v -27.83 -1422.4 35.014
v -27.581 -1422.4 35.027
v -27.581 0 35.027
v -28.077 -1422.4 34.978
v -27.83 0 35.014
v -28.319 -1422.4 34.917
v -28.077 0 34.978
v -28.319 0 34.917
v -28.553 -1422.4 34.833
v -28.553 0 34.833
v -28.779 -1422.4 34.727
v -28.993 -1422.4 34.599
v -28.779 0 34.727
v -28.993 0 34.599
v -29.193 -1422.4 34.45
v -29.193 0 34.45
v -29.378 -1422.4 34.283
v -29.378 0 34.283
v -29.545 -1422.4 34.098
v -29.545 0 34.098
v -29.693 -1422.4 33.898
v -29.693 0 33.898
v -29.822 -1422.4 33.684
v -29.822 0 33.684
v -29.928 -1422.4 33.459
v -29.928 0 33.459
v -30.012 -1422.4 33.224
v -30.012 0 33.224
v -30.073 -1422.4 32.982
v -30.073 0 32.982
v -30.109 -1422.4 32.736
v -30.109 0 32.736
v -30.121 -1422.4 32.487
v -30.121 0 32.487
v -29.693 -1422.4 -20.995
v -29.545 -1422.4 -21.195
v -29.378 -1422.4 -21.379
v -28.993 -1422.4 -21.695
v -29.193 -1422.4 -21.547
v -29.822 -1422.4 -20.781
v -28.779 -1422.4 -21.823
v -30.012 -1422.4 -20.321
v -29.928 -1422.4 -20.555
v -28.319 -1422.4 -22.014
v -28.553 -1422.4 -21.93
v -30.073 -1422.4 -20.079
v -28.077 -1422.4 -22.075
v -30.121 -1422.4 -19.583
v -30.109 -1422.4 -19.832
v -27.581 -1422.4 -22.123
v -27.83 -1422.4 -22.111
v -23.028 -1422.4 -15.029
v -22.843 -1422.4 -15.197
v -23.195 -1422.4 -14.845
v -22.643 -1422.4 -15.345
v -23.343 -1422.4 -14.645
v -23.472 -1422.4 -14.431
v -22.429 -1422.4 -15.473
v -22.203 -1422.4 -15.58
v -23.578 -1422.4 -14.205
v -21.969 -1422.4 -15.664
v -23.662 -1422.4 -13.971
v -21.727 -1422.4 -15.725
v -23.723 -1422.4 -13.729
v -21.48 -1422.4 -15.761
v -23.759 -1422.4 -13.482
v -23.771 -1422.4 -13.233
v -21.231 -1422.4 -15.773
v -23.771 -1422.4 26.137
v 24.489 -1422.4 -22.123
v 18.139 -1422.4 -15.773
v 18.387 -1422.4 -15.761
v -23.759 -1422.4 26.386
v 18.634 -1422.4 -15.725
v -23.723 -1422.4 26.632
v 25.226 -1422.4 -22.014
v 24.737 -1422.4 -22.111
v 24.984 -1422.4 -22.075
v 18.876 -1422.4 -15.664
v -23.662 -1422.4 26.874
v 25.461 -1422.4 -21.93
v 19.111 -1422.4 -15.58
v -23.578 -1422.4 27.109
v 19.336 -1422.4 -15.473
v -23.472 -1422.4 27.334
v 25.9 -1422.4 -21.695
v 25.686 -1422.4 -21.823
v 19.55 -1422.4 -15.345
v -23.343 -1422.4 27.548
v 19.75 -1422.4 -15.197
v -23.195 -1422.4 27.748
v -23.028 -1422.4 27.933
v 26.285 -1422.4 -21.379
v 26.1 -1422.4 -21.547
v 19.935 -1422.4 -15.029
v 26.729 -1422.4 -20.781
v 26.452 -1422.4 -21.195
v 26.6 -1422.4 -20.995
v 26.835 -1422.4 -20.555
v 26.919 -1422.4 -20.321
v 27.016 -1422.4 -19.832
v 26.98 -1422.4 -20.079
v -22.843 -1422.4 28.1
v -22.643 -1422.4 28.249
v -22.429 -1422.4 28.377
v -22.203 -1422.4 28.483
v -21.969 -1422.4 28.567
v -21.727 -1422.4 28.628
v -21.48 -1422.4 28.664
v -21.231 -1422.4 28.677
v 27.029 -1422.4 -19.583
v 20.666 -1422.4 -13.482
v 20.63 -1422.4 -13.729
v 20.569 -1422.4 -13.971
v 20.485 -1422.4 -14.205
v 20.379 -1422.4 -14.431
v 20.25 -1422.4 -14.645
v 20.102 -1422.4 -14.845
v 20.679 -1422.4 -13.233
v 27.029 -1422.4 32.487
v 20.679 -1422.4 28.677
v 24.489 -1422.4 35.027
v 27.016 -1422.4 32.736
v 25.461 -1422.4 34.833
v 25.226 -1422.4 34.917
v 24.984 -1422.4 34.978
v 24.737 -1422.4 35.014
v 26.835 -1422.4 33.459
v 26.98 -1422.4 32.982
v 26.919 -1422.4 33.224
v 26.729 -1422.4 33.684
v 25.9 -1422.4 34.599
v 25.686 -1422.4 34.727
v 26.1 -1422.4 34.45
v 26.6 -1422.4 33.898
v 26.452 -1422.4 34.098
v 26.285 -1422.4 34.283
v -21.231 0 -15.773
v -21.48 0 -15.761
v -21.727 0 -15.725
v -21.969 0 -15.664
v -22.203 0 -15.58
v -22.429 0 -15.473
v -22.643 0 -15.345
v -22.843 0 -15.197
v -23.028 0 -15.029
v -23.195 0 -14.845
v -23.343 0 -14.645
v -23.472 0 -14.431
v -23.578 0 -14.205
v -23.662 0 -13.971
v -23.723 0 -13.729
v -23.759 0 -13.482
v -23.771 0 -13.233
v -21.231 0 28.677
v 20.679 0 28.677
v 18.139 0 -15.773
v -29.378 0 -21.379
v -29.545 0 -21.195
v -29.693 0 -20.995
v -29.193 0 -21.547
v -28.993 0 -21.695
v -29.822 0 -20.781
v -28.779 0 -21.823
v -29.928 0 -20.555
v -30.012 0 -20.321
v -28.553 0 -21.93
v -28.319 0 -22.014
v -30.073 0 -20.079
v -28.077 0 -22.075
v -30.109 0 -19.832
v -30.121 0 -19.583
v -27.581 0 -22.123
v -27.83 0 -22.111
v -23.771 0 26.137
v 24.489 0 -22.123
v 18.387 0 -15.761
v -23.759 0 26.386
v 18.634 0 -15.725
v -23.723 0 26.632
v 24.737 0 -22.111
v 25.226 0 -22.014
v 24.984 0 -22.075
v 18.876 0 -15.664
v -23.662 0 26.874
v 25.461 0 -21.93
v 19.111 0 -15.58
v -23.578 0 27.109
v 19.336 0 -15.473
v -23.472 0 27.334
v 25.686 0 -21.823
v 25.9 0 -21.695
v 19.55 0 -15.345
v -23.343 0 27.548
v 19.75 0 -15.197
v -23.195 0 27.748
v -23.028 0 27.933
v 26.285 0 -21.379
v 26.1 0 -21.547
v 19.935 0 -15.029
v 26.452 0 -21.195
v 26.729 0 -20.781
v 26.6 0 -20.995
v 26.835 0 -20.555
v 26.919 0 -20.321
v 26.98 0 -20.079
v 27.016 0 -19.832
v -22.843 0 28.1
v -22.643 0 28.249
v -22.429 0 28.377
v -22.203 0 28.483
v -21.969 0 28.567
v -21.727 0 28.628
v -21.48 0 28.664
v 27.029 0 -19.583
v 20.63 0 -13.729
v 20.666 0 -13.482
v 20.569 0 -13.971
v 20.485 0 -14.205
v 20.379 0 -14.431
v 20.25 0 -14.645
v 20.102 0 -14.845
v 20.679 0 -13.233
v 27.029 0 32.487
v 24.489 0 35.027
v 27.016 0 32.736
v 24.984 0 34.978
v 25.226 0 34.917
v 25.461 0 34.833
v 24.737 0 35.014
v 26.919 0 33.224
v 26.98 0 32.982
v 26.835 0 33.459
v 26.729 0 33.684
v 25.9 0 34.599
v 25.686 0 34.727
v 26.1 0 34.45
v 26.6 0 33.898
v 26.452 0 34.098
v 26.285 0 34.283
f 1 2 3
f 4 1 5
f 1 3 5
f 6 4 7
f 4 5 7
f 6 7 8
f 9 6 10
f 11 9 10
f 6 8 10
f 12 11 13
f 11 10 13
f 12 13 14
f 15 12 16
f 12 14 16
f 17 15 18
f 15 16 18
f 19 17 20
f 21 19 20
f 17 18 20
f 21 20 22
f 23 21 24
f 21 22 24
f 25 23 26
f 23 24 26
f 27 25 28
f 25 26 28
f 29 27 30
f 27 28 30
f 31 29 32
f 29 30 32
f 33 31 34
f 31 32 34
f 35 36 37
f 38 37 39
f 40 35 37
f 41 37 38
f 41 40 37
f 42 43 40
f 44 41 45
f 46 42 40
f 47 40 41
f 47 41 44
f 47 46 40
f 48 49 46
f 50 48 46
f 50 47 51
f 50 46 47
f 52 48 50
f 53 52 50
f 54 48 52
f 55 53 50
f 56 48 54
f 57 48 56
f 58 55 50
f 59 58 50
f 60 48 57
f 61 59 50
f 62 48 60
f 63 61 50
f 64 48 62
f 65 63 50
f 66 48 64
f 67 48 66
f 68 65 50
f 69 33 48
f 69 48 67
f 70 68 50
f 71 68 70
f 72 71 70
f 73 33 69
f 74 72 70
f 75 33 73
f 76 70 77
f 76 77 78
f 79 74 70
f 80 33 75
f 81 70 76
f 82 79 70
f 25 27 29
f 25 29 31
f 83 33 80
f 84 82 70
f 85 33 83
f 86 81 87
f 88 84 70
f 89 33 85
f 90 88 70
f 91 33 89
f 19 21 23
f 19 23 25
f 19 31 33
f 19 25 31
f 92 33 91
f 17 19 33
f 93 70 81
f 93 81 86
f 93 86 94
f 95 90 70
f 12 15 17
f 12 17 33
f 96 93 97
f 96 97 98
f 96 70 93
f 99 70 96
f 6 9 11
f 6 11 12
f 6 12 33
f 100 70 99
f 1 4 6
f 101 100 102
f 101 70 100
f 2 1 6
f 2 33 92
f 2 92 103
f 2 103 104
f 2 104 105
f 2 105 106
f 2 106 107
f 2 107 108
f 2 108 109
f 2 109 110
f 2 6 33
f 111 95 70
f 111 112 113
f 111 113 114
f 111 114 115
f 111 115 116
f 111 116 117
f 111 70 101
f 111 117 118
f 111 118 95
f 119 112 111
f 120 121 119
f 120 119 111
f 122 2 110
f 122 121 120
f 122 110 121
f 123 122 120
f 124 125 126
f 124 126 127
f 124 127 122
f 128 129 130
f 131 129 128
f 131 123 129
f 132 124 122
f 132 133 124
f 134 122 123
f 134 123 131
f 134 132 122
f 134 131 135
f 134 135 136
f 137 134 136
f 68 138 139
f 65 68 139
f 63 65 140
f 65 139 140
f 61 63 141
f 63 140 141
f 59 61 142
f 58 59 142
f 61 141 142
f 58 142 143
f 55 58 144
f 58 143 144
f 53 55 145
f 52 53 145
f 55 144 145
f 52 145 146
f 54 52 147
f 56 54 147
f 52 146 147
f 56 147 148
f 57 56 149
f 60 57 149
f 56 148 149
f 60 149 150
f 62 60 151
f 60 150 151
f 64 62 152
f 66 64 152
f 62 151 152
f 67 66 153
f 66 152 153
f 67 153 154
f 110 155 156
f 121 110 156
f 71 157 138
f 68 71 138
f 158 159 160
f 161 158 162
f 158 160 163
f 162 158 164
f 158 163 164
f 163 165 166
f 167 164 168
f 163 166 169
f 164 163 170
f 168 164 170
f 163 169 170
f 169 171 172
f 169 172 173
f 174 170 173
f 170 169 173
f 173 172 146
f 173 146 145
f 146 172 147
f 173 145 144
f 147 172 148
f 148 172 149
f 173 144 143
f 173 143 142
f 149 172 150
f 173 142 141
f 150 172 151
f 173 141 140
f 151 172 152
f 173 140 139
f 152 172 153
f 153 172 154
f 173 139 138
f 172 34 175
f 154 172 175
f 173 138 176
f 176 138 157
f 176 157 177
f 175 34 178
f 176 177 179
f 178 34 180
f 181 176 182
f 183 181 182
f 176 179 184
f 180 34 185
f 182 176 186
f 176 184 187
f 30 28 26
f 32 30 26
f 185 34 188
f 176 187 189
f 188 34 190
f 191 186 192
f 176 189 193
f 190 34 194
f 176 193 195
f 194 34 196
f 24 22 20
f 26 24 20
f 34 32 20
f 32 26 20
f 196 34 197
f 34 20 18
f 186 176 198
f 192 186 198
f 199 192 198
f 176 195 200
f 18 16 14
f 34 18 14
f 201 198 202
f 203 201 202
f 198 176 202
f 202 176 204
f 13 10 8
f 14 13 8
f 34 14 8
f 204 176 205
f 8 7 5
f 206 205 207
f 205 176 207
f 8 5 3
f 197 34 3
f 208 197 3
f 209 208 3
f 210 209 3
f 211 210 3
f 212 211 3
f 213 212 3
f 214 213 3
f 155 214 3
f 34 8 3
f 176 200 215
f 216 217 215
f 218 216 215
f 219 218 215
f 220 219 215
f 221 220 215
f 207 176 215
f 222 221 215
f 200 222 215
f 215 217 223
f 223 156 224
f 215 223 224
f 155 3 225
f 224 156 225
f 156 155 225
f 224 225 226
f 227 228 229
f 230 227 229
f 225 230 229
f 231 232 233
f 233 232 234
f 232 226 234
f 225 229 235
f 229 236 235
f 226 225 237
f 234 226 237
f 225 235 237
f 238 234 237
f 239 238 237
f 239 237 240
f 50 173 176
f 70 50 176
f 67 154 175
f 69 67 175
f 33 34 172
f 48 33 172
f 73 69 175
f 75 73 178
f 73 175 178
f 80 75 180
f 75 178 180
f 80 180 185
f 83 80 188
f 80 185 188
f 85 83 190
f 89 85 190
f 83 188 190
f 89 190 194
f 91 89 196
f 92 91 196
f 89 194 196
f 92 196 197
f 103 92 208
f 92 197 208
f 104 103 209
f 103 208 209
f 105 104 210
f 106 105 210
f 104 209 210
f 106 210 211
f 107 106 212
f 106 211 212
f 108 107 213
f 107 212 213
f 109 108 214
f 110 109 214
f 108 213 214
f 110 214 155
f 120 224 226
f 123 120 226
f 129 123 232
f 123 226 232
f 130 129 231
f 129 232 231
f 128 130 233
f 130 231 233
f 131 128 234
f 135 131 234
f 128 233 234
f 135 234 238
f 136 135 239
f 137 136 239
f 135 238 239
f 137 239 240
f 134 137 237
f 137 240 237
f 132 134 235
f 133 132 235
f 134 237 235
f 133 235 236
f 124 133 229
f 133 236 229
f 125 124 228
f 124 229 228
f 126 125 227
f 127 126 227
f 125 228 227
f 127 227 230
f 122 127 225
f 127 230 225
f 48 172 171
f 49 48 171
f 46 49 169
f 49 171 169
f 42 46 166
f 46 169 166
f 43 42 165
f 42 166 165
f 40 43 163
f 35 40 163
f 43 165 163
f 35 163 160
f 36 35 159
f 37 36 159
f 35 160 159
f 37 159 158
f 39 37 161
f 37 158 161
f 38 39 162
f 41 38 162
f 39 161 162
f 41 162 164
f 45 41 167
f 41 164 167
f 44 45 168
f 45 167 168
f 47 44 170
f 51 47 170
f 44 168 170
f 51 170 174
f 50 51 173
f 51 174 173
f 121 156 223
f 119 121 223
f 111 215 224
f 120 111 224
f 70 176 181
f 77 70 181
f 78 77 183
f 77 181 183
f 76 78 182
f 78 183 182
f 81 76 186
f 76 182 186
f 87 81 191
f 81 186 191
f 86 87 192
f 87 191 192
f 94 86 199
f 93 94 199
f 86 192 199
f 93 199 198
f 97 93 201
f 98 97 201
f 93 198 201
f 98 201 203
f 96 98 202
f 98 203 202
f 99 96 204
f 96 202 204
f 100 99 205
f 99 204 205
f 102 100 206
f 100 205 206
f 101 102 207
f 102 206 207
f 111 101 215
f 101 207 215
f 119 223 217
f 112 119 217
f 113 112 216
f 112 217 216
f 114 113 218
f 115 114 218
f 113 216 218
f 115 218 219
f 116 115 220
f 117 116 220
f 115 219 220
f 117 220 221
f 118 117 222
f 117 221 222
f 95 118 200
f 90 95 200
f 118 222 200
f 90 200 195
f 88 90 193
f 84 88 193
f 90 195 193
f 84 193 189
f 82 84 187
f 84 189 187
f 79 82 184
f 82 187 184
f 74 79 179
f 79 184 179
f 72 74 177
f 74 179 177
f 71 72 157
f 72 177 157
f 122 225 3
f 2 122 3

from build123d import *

# Parameters (mm, degrees)
F1_DEPTH = 1422.4


with BuildPart() as f1:
    # F0 (on Front) → F1 (new body)
    with BuildSketch(Plane.XZ):
        with BuildLine():
            Line((24.488532, 35.02659), (-27.581468, 35.02659))
            ThreePointArc((-27.581468, 35.02659), (-29.377519, 34.282641), (-30.121468, 32.48659))
            Line((-30.121468, 32.48659), (-30.121468, -19.58341))
            ThreePointArc((-30.121468, -19.58341), (-29.377519, -21.379462), (-27.581468, -22.12341))
            Line((-27.581468, -22.12341), (24.488532, -22.12341))
            ThreePointArc((24.488532, -22.12341), (26.284584, -21.379462), (27.028532, -19.58341))
            Line((27.028532, -19.58341), (27.028532, 32.48659))
            ThreePointArc((27.028532, 32.48659), (26.284584, 34.282641), (24.488532, 35.02659))
        make_face()
        with BuildLine():
            ThreePointArc((-23.771468, 26.13659), (-23.027519, 27.932641), (-21.231468, 28.67659))
            Line((-21.231468, 28.67659), (20.678532, 28.67659))
            Line((20.678532, 28.67659), (20.678532, -13.23341))
            ThreePointArc((20.678532, -13.23341), (19.934584, -15.029462), (18.138532, -15.77341))
            Line((18.138532, -15.77341), (-21.231468, -15.77341))
            ThreePointArc((-21.231468, -15.77341), (-23.027519, -15.029462), (-23.771468, -13.23341))
            Line((-23.771468, -13.23341), (-23.771468, 26.13659))
        make_face(mode=Mode.SUBTRACT)
    extrude(amount=F1_DEPTH)


solid = f1.part
